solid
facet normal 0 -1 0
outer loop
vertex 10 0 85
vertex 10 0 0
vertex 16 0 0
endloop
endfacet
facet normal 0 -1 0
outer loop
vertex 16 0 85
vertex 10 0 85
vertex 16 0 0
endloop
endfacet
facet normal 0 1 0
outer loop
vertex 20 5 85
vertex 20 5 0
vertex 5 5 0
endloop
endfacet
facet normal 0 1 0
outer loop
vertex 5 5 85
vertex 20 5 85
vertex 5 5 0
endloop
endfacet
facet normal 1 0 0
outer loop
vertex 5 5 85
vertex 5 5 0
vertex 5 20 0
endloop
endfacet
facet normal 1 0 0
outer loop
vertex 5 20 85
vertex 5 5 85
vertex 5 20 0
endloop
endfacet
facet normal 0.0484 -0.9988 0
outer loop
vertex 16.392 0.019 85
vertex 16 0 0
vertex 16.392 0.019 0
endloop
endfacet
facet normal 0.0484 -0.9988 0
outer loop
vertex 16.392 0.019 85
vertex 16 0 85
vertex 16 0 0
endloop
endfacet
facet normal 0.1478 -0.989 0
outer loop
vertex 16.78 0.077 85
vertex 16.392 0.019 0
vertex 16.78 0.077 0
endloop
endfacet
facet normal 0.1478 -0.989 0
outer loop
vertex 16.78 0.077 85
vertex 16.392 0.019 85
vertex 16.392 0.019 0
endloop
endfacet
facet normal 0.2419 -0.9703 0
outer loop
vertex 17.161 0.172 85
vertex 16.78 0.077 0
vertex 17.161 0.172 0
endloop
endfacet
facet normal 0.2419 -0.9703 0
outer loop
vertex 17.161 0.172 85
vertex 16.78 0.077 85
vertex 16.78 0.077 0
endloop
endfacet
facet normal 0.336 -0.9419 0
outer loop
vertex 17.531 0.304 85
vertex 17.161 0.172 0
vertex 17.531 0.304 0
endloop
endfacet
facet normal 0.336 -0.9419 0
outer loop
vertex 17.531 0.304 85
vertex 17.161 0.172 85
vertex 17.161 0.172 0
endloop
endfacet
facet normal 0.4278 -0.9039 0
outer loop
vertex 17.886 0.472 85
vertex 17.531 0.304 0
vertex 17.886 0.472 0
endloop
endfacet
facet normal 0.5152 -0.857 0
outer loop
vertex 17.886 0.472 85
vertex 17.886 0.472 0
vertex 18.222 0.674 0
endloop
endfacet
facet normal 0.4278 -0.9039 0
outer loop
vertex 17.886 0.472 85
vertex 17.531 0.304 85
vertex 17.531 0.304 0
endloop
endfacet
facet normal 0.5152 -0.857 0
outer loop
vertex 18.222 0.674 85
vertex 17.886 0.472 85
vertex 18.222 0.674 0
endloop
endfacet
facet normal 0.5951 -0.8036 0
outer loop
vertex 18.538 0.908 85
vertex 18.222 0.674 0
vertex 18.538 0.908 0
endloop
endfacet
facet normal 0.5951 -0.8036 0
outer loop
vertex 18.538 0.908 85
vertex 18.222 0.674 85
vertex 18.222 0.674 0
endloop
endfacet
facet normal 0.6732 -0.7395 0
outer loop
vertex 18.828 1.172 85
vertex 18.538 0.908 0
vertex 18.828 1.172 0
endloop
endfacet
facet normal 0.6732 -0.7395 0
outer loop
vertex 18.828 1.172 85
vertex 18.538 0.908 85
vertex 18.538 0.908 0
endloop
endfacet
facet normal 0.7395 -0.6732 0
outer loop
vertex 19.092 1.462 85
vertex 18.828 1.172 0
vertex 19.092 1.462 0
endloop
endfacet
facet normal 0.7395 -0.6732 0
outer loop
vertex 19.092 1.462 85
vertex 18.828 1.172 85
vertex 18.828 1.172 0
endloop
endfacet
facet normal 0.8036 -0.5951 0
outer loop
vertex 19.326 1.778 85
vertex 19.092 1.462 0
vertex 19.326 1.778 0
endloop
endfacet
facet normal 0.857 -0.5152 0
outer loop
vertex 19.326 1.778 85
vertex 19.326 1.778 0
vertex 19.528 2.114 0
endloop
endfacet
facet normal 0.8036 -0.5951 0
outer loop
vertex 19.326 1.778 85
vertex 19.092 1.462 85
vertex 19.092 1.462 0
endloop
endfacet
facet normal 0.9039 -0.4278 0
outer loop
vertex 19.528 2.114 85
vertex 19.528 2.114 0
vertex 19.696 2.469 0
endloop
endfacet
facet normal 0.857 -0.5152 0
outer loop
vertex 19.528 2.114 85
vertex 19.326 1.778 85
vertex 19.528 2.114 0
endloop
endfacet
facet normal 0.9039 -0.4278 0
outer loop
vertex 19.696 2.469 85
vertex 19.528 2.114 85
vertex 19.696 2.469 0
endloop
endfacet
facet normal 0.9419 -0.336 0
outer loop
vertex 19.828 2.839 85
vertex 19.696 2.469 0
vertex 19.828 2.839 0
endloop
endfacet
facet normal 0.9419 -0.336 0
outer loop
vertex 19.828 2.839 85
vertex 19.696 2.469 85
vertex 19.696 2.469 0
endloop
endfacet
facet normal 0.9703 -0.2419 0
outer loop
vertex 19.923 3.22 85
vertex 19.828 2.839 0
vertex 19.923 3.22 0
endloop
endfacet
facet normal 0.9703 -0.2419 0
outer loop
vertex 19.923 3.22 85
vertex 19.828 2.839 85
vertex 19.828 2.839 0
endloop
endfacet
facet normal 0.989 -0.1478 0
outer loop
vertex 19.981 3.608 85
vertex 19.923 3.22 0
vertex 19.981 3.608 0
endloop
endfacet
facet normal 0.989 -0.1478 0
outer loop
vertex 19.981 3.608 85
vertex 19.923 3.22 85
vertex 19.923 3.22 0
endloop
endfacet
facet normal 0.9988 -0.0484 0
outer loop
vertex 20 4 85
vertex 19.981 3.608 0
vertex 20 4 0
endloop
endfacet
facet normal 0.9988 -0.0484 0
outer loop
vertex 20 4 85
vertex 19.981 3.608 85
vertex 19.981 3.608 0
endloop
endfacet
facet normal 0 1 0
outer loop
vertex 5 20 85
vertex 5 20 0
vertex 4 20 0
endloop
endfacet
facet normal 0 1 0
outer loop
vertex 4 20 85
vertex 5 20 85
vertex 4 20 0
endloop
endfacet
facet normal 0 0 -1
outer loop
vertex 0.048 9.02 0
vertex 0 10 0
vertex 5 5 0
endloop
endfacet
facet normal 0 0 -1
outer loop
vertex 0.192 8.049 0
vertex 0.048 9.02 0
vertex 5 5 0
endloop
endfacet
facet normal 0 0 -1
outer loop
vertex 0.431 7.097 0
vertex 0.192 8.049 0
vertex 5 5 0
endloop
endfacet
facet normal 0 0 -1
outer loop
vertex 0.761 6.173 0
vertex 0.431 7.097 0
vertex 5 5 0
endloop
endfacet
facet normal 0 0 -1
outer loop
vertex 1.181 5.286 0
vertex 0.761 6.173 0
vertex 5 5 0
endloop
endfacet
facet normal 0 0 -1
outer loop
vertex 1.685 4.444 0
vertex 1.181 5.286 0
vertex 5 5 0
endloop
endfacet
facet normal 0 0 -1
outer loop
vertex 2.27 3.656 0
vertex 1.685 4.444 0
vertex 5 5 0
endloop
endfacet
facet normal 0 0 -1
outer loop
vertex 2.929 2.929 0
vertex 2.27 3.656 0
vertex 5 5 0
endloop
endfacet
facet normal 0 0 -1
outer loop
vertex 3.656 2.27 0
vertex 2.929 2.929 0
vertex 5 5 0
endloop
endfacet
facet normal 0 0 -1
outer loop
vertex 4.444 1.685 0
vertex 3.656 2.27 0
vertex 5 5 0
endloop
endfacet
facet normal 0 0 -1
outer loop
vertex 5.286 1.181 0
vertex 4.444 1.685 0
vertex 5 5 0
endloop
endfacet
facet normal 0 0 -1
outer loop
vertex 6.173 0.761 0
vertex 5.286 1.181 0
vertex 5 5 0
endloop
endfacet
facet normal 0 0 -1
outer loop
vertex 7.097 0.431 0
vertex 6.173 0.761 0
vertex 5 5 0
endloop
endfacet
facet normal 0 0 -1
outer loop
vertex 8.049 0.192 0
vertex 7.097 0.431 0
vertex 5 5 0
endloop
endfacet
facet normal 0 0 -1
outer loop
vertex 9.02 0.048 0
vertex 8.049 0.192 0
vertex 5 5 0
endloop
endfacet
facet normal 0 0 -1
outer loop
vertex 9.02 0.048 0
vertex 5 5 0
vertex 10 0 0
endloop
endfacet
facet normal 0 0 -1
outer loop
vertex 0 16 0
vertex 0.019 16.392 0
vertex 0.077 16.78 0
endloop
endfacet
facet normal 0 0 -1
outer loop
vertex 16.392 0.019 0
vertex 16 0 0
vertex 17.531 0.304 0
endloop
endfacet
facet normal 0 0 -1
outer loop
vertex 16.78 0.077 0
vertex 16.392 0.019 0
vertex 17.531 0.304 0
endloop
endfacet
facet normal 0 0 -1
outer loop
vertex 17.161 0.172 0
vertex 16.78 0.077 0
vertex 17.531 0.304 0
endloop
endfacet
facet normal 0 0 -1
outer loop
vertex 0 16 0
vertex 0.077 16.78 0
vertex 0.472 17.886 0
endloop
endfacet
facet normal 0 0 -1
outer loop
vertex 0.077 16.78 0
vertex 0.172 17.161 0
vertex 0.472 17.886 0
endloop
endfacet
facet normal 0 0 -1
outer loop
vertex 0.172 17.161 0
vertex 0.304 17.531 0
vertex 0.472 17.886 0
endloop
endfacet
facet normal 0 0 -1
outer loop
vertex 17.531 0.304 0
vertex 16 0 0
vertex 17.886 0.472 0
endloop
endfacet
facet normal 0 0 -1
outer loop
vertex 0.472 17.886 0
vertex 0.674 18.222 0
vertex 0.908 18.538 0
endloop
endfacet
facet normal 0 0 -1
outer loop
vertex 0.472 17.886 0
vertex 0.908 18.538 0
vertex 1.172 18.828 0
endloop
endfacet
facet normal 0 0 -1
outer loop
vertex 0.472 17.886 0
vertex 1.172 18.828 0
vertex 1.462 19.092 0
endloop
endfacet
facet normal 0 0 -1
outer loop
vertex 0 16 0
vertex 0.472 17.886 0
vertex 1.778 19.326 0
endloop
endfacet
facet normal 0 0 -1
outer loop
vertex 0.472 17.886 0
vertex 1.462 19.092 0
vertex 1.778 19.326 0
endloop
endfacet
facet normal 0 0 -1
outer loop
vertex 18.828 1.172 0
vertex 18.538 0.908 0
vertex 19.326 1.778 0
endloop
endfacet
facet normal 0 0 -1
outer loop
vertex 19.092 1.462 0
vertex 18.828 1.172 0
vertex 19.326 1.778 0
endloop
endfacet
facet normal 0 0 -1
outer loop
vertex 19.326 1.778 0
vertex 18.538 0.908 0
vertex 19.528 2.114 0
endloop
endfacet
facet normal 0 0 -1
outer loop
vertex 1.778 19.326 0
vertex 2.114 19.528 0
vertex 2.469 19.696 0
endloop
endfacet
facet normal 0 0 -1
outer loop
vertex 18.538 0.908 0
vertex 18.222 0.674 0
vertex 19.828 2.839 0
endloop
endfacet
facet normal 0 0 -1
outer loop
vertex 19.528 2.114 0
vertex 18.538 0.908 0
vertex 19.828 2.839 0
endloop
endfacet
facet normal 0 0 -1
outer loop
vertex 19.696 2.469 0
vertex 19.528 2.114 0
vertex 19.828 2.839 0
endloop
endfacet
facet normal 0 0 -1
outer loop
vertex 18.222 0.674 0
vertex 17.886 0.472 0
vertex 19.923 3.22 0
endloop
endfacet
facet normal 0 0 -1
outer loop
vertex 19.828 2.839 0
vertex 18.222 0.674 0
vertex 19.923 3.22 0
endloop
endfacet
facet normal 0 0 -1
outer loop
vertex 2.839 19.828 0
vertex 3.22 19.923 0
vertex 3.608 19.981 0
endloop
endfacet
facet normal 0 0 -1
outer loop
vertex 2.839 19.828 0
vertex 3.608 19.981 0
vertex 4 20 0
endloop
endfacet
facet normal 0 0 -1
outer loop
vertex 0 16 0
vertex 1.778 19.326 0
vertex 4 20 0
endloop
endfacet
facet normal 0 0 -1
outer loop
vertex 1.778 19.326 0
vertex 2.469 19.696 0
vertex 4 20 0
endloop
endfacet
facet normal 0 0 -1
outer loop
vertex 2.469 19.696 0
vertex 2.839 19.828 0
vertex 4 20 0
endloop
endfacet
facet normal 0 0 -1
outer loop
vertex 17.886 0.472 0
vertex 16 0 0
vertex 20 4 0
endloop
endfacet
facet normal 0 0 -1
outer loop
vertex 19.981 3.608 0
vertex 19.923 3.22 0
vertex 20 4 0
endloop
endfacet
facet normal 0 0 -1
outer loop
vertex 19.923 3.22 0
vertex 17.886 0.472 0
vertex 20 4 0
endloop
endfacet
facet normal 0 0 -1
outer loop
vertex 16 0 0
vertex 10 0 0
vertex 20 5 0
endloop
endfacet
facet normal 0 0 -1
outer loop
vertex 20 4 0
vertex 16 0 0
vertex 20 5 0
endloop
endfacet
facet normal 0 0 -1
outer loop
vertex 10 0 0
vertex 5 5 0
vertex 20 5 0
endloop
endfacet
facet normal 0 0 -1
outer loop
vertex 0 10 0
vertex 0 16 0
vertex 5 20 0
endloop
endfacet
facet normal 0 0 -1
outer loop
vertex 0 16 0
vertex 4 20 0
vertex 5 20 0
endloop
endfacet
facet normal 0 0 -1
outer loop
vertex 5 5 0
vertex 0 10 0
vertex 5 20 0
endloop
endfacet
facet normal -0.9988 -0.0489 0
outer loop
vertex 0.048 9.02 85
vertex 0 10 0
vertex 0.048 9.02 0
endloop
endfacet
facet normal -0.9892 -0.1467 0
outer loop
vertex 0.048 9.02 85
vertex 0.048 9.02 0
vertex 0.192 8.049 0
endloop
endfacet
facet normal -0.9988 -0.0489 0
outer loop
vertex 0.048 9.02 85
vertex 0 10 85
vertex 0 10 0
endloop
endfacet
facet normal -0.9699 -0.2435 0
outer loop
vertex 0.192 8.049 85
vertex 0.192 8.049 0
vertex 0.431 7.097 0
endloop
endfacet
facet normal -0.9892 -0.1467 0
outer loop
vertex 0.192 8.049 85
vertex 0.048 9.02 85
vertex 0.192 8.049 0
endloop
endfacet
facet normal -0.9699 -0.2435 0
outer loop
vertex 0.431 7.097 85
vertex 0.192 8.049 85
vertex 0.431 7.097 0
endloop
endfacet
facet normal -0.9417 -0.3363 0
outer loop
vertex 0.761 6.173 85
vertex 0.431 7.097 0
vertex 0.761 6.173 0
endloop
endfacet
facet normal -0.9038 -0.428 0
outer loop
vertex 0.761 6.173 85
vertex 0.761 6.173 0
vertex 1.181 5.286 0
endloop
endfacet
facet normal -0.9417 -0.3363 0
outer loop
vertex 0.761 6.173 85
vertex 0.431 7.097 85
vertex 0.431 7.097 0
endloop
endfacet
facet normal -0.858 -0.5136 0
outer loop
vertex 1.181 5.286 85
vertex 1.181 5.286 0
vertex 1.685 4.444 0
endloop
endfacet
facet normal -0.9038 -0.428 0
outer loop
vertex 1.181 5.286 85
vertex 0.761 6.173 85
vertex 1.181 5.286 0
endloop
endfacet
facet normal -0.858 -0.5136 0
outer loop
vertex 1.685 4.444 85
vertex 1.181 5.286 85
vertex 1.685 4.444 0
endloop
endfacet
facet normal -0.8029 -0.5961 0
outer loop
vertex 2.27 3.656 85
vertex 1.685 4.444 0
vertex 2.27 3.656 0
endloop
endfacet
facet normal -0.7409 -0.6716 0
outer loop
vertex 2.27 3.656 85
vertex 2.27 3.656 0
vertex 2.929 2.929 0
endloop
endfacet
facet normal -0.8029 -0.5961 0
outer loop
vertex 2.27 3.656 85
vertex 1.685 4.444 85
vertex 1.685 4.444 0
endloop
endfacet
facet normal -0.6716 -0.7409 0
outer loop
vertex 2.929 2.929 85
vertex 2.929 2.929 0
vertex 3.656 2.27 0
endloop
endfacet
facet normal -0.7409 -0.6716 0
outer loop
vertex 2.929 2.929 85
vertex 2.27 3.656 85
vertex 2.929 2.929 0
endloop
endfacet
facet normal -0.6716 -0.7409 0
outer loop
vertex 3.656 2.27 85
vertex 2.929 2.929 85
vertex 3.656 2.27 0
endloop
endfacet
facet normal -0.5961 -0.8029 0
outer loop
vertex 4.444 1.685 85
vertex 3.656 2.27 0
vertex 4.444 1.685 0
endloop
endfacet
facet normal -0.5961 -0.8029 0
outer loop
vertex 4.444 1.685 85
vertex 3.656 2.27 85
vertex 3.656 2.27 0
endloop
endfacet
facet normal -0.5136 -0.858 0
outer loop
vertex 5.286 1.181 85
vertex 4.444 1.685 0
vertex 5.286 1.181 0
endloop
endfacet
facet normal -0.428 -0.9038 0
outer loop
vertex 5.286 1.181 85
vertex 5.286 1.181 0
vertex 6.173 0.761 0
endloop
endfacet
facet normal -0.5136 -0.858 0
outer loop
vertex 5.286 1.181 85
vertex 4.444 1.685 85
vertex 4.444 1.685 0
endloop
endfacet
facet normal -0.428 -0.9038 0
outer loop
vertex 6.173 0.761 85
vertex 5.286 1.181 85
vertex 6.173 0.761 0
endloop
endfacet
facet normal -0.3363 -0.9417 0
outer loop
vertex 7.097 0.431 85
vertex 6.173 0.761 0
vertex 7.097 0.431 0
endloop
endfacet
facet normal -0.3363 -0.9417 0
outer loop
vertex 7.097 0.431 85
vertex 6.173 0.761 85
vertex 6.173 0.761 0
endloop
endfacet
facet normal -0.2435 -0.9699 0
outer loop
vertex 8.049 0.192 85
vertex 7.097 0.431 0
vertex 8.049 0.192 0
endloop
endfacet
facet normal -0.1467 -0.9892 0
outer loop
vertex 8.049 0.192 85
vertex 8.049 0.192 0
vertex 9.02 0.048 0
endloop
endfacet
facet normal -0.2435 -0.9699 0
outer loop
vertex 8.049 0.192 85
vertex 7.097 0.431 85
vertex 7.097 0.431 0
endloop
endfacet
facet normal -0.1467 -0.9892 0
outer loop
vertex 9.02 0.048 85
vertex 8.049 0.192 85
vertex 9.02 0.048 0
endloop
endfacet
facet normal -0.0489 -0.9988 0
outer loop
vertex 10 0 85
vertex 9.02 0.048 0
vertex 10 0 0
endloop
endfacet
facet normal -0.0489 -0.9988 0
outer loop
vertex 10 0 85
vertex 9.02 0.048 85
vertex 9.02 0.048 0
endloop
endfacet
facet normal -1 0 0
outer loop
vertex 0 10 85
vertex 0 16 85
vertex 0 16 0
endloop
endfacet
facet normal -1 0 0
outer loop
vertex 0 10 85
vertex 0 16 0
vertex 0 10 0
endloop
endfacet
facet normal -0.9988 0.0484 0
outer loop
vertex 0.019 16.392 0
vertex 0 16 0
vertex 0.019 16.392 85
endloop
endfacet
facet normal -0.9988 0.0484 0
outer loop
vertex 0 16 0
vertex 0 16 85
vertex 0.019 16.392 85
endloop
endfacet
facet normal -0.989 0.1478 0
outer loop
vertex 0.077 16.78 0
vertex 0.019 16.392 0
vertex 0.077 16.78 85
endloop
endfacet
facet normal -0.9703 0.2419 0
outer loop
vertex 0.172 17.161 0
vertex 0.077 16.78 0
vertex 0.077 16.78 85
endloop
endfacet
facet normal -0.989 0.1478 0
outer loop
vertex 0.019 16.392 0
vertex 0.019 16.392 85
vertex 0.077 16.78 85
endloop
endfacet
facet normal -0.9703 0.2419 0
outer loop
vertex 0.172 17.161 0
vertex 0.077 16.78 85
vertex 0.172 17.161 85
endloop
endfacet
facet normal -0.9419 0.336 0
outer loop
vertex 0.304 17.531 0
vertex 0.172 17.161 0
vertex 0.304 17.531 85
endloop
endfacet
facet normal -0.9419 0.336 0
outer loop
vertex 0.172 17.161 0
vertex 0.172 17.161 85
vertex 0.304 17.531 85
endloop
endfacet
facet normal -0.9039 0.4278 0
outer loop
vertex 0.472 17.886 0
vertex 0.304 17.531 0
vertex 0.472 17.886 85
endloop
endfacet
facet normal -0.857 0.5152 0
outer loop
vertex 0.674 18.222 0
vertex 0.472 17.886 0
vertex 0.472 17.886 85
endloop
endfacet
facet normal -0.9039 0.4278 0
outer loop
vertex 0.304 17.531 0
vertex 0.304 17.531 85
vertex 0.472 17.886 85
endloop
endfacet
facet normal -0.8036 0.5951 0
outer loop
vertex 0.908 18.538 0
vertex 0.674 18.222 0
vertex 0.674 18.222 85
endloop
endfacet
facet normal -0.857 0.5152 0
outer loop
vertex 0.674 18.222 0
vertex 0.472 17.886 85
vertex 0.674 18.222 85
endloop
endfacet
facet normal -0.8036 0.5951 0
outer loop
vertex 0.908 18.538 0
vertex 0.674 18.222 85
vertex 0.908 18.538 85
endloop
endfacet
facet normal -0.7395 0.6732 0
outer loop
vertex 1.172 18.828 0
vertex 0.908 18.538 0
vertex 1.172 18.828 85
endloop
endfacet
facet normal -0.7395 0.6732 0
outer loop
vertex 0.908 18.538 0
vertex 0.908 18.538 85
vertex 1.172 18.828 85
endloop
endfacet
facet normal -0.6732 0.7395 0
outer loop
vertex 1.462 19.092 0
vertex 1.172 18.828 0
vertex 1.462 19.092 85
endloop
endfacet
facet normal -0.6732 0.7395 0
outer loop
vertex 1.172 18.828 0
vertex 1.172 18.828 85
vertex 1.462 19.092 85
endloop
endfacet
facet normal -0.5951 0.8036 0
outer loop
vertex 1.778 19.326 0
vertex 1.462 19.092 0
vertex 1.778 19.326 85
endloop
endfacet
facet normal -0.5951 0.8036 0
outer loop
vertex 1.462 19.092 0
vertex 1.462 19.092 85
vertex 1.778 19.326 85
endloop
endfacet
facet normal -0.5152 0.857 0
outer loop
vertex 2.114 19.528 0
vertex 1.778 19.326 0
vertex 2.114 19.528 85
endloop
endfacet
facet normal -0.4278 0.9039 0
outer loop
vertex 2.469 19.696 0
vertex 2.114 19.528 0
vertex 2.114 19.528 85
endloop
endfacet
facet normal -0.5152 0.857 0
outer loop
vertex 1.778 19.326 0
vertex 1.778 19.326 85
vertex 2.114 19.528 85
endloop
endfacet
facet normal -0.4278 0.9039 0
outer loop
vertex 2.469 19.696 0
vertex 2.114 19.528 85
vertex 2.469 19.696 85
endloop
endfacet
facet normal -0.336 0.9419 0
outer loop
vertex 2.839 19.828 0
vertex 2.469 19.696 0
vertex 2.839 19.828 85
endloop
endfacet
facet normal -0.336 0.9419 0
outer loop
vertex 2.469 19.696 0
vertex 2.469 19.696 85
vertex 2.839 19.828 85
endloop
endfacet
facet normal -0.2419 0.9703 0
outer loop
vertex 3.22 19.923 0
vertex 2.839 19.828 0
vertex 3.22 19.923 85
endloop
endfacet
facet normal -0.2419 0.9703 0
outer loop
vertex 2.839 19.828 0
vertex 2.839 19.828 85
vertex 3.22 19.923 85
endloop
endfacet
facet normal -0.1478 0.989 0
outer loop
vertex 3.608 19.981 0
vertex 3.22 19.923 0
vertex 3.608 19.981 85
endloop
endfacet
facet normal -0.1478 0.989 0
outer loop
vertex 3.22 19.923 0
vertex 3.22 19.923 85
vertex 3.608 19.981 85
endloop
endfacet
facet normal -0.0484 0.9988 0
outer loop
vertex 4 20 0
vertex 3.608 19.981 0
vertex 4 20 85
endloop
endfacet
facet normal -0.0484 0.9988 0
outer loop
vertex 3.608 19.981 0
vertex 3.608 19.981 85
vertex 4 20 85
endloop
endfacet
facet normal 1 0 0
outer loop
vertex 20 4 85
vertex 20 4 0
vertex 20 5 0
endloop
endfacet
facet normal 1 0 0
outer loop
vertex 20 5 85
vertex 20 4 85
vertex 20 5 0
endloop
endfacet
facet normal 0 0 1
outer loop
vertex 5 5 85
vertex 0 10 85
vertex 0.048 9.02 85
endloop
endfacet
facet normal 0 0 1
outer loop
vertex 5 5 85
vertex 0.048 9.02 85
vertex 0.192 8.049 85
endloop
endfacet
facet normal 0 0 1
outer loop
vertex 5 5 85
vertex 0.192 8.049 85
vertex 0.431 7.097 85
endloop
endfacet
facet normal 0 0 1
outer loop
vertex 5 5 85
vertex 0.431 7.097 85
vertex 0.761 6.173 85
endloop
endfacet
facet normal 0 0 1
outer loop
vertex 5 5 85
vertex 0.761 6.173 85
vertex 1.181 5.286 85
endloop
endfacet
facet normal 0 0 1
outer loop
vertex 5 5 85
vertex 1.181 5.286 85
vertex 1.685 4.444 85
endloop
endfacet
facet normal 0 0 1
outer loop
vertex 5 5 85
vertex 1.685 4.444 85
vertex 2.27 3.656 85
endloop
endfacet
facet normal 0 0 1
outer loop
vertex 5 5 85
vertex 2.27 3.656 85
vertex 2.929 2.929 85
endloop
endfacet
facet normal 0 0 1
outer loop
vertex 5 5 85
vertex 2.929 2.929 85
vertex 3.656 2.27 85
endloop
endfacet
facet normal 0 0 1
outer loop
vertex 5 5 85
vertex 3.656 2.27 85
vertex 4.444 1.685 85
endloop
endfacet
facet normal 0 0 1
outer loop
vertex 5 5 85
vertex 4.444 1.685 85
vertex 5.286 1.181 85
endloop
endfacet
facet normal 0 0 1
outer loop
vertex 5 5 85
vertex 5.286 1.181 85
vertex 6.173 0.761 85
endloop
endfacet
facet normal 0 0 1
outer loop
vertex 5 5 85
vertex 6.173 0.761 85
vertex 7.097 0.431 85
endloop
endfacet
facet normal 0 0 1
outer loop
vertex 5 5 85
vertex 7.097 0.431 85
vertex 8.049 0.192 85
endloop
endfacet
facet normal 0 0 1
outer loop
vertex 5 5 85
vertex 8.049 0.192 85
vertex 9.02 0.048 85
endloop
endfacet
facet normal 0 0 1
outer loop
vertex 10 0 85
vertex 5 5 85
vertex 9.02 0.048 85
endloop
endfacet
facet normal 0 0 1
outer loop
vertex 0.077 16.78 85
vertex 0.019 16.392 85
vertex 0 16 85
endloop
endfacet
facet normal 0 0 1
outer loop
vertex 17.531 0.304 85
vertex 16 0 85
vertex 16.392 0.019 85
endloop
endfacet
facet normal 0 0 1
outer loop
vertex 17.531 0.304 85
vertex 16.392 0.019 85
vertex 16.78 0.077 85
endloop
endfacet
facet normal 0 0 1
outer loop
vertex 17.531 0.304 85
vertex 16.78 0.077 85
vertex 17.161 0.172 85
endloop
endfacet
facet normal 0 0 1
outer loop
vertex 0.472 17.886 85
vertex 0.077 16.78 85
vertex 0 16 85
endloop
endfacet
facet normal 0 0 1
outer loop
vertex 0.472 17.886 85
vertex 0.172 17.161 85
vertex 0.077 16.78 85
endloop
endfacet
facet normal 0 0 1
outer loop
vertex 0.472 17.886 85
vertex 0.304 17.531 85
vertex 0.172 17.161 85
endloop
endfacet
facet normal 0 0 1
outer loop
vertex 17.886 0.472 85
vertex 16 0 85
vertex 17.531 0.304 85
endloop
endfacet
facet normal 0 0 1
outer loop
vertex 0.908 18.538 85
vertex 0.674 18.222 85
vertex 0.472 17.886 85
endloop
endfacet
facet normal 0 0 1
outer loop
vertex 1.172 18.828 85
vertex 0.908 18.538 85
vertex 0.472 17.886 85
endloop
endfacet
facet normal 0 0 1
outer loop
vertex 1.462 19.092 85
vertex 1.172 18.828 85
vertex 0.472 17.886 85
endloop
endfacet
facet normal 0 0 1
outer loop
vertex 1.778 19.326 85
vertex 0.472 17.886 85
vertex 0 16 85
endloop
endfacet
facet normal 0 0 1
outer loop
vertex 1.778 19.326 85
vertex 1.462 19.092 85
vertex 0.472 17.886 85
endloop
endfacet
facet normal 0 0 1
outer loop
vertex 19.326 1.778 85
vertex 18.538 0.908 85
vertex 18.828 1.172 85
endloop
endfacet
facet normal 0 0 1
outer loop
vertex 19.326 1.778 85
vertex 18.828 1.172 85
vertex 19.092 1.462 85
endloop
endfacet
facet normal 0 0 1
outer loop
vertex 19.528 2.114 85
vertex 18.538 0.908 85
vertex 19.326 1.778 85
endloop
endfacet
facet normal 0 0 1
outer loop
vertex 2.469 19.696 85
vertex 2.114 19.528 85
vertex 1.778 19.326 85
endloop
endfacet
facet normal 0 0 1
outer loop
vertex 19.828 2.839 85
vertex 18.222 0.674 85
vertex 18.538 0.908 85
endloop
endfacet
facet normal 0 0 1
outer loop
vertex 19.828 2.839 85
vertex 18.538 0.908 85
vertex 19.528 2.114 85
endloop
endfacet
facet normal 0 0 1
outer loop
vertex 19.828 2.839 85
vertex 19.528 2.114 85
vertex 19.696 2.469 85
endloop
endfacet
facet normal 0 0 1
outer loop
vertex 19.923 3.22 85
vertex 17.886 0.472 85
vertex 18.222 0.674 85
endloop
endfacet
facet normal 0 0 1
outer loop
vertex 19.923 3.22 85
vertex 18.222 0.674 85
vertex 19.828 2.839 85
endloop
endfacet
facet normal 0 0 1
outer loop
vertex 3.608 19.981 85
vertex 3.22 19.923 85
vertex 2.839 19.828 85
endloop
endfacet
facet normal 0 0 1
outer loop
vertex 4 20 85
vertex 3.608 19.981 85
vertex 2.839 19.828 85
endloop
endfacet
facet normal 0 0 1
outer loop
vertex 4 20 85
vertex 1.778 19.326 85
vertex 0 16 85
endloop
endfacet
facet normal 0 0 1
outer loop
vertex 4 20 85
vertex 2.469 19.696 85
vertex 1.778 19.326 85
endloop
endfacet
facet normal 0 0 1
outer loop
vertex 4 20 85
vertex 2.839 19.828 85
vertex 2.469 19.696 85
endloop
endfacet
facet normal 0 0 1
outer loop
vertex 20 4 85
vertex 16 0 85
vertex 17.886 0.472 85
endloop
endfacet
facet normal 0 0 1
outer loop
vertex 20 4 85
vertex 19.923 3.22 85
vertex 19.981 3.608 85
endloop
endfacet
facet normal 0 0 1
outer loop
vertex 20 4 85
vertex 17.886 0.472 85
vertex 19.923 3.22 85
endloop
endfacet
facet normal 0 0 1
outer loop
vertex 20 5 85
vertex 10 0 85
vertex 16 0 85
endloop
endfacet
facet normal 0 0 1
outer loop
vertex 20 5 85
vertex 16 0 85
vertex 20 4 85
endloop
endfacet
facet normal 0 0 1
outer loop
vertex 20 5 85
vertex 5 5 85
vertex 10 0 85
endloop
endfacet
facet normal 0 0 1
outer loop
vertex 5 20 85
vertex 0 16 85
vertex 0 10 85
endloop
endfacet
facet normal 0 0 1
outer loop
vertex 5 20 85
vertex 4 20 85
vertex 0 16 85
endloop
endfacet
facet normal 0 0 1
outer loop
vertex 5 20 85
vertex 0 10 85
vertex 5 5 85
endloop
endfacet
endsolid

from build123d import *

# Parameters (mm, degrees)
PAD_DEPTH   = 85
FILLET_R    = 10
FILLET001_R = 4


with BuildPart() as part:
    # Sketch → Pad (new body)
    with BuildSketch(Plane.XY):
        Polygon((0, 20), (0, 0), (20, 0), (20, 5), (5, 5), (5, 20), align=None)
    extrude(amount=PAD_DEPTH)

    # Fillet
    fillet_edges = [part.edges().sort_by_distance(p)[0] for p in [
        (0, 0, 42.5),
    ]]
    fillet(fillet_edges, radius=FILLET_R)

    # Fillet001
    fillet001_edges = [part.edges().sort_by_distance(p)[0] for p in [
        (0, 20, 42.5),
        (20, 0, 42.5),
    ]]
    fillet(fillet001_edges, radius=FILLET001_R)


solid = part.part
